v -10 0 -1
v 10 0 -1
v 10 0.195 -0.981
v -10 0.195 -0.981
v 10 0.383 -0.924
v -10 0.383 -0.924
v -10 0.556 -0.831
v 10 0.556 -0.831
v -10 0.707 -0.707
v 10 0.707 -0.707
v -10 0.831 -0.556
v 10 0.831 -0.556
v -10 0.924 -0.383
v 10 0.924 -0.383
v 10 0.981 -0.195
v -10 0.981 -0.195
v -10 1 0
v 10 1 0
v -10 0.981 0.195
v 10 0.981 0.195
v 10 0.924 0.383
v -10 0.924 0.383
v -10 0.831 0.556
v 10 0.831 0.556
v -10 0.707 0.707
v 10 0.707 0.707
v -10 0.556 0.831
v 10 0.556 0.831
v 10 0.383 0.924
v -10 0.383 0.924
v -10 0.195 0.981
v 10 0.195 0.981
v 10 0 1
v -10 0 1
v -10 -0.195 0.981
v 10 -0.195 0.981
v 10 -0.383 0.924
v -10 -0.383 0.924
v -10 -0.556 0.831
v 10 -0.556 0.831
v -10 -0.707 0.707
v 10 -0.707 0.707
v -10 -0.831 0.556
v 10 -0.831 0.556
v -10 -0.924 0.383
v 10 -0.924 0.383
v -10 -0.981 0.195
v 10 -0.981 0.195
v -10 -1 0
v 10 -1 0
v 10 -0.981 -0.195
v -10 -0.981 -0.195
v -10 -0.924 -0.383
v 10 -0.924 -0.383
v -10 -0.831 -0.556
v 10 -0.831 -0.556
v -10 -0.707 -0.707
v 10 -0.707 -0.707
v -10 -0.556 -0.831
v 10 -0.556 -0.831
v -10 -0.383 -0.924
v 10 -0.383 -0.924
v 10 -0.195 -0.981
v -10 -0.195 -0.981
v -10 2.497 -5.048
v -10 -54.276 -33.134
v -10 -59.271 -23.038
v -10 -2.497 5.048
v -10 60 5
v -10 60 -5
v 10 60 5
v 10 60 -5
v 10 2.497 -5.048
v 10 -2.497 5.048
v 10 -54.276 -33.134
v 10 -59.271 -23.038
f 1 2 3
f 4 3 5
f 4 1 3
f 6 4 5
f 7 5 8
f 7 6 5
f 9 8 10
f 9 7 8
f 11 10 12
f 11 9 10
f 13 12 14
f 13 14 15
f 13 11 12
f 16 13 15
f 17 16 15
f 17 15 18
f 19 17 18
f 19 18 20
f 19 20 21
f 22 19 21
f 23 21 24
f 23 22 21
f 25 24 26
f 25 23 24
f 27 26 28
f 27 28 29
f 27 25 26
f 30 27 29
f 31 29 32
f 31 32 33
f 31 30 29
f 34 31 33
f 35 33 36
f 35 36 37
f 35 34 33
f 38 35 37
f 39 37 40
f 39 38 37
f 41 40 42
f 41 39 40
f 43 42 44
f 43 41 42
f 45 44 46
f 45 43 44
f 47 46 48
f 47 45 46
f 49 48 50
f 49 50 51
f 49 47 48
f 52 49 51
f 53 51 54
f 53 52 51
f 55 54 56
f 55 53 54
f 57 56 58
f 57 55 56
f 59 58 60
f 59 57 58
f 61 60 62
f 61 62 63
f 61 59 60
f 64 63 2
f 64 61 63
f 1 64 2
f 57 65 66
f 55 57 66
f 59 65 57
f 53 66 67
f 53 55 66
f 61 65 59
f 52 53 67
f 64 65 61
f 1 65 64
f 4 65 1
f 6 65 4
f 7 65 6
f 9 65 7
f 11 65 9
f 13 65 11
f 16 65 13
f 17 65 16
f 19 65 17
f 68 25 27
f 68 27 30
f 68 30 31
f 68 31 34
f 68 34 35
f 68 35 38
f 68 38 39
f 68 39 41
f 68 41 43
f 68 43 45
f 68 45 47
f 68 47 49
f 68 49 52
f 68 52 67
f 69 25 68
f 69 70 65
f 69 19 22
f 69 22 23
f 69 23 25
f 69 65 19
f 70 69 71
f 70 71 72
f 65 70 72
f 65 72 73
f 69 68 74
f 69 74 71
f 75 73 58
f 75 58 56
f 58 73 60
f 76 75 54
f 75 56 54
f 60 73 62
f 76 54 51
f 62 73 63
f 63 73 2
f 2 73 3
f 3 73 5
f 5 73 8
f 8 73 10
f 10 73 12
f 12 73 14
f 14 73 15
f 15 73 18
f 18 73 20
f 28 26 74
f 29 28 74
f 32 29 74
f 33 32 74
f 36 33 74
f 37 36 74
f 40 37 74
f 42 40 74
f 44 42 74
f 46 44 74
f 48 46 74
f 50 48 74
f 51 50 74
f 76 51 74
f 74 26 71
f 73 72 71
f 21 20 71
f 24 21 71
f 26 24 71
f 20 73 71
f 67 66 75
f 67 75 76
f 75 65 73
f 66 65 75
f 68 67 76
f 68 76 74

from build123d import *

# Parameters (mm, degrees)
BOSS_EXTRU_1_DEPTH      = 10
BOSS_EXTRU_1_DEPTH_BACK = 10
ESQUISSE1_R             = 1


with BuildPart() as part:
    # Esquisse1 → Boss.-Extru.1 (new, two sides: drawn at the far end of the back side and taken through both)
    with BuildSketch(Plane(origin=(0, 0, 0), x_dir=(0, 0, -1), z_dir=(1, 0, 0)).offset(-BOSS_EXTRU_1_DEPTH_BACK)):
        Polygon((5.047823589, 2.497154895), (33.133709904, -54.276495693), (23.038062725, -59.270805483), (-5.047823589, -2.497154895), (-5, 60), (5, 60), align=None)
        Circle(ESQUISSE1_R, mode=Mode.SUBTRACT)
    extrude(amount=BOSS_EXTRU_1_DEPTH + BOSS_EXTRU_1_DEPTH_BACK)


solid = part.part
